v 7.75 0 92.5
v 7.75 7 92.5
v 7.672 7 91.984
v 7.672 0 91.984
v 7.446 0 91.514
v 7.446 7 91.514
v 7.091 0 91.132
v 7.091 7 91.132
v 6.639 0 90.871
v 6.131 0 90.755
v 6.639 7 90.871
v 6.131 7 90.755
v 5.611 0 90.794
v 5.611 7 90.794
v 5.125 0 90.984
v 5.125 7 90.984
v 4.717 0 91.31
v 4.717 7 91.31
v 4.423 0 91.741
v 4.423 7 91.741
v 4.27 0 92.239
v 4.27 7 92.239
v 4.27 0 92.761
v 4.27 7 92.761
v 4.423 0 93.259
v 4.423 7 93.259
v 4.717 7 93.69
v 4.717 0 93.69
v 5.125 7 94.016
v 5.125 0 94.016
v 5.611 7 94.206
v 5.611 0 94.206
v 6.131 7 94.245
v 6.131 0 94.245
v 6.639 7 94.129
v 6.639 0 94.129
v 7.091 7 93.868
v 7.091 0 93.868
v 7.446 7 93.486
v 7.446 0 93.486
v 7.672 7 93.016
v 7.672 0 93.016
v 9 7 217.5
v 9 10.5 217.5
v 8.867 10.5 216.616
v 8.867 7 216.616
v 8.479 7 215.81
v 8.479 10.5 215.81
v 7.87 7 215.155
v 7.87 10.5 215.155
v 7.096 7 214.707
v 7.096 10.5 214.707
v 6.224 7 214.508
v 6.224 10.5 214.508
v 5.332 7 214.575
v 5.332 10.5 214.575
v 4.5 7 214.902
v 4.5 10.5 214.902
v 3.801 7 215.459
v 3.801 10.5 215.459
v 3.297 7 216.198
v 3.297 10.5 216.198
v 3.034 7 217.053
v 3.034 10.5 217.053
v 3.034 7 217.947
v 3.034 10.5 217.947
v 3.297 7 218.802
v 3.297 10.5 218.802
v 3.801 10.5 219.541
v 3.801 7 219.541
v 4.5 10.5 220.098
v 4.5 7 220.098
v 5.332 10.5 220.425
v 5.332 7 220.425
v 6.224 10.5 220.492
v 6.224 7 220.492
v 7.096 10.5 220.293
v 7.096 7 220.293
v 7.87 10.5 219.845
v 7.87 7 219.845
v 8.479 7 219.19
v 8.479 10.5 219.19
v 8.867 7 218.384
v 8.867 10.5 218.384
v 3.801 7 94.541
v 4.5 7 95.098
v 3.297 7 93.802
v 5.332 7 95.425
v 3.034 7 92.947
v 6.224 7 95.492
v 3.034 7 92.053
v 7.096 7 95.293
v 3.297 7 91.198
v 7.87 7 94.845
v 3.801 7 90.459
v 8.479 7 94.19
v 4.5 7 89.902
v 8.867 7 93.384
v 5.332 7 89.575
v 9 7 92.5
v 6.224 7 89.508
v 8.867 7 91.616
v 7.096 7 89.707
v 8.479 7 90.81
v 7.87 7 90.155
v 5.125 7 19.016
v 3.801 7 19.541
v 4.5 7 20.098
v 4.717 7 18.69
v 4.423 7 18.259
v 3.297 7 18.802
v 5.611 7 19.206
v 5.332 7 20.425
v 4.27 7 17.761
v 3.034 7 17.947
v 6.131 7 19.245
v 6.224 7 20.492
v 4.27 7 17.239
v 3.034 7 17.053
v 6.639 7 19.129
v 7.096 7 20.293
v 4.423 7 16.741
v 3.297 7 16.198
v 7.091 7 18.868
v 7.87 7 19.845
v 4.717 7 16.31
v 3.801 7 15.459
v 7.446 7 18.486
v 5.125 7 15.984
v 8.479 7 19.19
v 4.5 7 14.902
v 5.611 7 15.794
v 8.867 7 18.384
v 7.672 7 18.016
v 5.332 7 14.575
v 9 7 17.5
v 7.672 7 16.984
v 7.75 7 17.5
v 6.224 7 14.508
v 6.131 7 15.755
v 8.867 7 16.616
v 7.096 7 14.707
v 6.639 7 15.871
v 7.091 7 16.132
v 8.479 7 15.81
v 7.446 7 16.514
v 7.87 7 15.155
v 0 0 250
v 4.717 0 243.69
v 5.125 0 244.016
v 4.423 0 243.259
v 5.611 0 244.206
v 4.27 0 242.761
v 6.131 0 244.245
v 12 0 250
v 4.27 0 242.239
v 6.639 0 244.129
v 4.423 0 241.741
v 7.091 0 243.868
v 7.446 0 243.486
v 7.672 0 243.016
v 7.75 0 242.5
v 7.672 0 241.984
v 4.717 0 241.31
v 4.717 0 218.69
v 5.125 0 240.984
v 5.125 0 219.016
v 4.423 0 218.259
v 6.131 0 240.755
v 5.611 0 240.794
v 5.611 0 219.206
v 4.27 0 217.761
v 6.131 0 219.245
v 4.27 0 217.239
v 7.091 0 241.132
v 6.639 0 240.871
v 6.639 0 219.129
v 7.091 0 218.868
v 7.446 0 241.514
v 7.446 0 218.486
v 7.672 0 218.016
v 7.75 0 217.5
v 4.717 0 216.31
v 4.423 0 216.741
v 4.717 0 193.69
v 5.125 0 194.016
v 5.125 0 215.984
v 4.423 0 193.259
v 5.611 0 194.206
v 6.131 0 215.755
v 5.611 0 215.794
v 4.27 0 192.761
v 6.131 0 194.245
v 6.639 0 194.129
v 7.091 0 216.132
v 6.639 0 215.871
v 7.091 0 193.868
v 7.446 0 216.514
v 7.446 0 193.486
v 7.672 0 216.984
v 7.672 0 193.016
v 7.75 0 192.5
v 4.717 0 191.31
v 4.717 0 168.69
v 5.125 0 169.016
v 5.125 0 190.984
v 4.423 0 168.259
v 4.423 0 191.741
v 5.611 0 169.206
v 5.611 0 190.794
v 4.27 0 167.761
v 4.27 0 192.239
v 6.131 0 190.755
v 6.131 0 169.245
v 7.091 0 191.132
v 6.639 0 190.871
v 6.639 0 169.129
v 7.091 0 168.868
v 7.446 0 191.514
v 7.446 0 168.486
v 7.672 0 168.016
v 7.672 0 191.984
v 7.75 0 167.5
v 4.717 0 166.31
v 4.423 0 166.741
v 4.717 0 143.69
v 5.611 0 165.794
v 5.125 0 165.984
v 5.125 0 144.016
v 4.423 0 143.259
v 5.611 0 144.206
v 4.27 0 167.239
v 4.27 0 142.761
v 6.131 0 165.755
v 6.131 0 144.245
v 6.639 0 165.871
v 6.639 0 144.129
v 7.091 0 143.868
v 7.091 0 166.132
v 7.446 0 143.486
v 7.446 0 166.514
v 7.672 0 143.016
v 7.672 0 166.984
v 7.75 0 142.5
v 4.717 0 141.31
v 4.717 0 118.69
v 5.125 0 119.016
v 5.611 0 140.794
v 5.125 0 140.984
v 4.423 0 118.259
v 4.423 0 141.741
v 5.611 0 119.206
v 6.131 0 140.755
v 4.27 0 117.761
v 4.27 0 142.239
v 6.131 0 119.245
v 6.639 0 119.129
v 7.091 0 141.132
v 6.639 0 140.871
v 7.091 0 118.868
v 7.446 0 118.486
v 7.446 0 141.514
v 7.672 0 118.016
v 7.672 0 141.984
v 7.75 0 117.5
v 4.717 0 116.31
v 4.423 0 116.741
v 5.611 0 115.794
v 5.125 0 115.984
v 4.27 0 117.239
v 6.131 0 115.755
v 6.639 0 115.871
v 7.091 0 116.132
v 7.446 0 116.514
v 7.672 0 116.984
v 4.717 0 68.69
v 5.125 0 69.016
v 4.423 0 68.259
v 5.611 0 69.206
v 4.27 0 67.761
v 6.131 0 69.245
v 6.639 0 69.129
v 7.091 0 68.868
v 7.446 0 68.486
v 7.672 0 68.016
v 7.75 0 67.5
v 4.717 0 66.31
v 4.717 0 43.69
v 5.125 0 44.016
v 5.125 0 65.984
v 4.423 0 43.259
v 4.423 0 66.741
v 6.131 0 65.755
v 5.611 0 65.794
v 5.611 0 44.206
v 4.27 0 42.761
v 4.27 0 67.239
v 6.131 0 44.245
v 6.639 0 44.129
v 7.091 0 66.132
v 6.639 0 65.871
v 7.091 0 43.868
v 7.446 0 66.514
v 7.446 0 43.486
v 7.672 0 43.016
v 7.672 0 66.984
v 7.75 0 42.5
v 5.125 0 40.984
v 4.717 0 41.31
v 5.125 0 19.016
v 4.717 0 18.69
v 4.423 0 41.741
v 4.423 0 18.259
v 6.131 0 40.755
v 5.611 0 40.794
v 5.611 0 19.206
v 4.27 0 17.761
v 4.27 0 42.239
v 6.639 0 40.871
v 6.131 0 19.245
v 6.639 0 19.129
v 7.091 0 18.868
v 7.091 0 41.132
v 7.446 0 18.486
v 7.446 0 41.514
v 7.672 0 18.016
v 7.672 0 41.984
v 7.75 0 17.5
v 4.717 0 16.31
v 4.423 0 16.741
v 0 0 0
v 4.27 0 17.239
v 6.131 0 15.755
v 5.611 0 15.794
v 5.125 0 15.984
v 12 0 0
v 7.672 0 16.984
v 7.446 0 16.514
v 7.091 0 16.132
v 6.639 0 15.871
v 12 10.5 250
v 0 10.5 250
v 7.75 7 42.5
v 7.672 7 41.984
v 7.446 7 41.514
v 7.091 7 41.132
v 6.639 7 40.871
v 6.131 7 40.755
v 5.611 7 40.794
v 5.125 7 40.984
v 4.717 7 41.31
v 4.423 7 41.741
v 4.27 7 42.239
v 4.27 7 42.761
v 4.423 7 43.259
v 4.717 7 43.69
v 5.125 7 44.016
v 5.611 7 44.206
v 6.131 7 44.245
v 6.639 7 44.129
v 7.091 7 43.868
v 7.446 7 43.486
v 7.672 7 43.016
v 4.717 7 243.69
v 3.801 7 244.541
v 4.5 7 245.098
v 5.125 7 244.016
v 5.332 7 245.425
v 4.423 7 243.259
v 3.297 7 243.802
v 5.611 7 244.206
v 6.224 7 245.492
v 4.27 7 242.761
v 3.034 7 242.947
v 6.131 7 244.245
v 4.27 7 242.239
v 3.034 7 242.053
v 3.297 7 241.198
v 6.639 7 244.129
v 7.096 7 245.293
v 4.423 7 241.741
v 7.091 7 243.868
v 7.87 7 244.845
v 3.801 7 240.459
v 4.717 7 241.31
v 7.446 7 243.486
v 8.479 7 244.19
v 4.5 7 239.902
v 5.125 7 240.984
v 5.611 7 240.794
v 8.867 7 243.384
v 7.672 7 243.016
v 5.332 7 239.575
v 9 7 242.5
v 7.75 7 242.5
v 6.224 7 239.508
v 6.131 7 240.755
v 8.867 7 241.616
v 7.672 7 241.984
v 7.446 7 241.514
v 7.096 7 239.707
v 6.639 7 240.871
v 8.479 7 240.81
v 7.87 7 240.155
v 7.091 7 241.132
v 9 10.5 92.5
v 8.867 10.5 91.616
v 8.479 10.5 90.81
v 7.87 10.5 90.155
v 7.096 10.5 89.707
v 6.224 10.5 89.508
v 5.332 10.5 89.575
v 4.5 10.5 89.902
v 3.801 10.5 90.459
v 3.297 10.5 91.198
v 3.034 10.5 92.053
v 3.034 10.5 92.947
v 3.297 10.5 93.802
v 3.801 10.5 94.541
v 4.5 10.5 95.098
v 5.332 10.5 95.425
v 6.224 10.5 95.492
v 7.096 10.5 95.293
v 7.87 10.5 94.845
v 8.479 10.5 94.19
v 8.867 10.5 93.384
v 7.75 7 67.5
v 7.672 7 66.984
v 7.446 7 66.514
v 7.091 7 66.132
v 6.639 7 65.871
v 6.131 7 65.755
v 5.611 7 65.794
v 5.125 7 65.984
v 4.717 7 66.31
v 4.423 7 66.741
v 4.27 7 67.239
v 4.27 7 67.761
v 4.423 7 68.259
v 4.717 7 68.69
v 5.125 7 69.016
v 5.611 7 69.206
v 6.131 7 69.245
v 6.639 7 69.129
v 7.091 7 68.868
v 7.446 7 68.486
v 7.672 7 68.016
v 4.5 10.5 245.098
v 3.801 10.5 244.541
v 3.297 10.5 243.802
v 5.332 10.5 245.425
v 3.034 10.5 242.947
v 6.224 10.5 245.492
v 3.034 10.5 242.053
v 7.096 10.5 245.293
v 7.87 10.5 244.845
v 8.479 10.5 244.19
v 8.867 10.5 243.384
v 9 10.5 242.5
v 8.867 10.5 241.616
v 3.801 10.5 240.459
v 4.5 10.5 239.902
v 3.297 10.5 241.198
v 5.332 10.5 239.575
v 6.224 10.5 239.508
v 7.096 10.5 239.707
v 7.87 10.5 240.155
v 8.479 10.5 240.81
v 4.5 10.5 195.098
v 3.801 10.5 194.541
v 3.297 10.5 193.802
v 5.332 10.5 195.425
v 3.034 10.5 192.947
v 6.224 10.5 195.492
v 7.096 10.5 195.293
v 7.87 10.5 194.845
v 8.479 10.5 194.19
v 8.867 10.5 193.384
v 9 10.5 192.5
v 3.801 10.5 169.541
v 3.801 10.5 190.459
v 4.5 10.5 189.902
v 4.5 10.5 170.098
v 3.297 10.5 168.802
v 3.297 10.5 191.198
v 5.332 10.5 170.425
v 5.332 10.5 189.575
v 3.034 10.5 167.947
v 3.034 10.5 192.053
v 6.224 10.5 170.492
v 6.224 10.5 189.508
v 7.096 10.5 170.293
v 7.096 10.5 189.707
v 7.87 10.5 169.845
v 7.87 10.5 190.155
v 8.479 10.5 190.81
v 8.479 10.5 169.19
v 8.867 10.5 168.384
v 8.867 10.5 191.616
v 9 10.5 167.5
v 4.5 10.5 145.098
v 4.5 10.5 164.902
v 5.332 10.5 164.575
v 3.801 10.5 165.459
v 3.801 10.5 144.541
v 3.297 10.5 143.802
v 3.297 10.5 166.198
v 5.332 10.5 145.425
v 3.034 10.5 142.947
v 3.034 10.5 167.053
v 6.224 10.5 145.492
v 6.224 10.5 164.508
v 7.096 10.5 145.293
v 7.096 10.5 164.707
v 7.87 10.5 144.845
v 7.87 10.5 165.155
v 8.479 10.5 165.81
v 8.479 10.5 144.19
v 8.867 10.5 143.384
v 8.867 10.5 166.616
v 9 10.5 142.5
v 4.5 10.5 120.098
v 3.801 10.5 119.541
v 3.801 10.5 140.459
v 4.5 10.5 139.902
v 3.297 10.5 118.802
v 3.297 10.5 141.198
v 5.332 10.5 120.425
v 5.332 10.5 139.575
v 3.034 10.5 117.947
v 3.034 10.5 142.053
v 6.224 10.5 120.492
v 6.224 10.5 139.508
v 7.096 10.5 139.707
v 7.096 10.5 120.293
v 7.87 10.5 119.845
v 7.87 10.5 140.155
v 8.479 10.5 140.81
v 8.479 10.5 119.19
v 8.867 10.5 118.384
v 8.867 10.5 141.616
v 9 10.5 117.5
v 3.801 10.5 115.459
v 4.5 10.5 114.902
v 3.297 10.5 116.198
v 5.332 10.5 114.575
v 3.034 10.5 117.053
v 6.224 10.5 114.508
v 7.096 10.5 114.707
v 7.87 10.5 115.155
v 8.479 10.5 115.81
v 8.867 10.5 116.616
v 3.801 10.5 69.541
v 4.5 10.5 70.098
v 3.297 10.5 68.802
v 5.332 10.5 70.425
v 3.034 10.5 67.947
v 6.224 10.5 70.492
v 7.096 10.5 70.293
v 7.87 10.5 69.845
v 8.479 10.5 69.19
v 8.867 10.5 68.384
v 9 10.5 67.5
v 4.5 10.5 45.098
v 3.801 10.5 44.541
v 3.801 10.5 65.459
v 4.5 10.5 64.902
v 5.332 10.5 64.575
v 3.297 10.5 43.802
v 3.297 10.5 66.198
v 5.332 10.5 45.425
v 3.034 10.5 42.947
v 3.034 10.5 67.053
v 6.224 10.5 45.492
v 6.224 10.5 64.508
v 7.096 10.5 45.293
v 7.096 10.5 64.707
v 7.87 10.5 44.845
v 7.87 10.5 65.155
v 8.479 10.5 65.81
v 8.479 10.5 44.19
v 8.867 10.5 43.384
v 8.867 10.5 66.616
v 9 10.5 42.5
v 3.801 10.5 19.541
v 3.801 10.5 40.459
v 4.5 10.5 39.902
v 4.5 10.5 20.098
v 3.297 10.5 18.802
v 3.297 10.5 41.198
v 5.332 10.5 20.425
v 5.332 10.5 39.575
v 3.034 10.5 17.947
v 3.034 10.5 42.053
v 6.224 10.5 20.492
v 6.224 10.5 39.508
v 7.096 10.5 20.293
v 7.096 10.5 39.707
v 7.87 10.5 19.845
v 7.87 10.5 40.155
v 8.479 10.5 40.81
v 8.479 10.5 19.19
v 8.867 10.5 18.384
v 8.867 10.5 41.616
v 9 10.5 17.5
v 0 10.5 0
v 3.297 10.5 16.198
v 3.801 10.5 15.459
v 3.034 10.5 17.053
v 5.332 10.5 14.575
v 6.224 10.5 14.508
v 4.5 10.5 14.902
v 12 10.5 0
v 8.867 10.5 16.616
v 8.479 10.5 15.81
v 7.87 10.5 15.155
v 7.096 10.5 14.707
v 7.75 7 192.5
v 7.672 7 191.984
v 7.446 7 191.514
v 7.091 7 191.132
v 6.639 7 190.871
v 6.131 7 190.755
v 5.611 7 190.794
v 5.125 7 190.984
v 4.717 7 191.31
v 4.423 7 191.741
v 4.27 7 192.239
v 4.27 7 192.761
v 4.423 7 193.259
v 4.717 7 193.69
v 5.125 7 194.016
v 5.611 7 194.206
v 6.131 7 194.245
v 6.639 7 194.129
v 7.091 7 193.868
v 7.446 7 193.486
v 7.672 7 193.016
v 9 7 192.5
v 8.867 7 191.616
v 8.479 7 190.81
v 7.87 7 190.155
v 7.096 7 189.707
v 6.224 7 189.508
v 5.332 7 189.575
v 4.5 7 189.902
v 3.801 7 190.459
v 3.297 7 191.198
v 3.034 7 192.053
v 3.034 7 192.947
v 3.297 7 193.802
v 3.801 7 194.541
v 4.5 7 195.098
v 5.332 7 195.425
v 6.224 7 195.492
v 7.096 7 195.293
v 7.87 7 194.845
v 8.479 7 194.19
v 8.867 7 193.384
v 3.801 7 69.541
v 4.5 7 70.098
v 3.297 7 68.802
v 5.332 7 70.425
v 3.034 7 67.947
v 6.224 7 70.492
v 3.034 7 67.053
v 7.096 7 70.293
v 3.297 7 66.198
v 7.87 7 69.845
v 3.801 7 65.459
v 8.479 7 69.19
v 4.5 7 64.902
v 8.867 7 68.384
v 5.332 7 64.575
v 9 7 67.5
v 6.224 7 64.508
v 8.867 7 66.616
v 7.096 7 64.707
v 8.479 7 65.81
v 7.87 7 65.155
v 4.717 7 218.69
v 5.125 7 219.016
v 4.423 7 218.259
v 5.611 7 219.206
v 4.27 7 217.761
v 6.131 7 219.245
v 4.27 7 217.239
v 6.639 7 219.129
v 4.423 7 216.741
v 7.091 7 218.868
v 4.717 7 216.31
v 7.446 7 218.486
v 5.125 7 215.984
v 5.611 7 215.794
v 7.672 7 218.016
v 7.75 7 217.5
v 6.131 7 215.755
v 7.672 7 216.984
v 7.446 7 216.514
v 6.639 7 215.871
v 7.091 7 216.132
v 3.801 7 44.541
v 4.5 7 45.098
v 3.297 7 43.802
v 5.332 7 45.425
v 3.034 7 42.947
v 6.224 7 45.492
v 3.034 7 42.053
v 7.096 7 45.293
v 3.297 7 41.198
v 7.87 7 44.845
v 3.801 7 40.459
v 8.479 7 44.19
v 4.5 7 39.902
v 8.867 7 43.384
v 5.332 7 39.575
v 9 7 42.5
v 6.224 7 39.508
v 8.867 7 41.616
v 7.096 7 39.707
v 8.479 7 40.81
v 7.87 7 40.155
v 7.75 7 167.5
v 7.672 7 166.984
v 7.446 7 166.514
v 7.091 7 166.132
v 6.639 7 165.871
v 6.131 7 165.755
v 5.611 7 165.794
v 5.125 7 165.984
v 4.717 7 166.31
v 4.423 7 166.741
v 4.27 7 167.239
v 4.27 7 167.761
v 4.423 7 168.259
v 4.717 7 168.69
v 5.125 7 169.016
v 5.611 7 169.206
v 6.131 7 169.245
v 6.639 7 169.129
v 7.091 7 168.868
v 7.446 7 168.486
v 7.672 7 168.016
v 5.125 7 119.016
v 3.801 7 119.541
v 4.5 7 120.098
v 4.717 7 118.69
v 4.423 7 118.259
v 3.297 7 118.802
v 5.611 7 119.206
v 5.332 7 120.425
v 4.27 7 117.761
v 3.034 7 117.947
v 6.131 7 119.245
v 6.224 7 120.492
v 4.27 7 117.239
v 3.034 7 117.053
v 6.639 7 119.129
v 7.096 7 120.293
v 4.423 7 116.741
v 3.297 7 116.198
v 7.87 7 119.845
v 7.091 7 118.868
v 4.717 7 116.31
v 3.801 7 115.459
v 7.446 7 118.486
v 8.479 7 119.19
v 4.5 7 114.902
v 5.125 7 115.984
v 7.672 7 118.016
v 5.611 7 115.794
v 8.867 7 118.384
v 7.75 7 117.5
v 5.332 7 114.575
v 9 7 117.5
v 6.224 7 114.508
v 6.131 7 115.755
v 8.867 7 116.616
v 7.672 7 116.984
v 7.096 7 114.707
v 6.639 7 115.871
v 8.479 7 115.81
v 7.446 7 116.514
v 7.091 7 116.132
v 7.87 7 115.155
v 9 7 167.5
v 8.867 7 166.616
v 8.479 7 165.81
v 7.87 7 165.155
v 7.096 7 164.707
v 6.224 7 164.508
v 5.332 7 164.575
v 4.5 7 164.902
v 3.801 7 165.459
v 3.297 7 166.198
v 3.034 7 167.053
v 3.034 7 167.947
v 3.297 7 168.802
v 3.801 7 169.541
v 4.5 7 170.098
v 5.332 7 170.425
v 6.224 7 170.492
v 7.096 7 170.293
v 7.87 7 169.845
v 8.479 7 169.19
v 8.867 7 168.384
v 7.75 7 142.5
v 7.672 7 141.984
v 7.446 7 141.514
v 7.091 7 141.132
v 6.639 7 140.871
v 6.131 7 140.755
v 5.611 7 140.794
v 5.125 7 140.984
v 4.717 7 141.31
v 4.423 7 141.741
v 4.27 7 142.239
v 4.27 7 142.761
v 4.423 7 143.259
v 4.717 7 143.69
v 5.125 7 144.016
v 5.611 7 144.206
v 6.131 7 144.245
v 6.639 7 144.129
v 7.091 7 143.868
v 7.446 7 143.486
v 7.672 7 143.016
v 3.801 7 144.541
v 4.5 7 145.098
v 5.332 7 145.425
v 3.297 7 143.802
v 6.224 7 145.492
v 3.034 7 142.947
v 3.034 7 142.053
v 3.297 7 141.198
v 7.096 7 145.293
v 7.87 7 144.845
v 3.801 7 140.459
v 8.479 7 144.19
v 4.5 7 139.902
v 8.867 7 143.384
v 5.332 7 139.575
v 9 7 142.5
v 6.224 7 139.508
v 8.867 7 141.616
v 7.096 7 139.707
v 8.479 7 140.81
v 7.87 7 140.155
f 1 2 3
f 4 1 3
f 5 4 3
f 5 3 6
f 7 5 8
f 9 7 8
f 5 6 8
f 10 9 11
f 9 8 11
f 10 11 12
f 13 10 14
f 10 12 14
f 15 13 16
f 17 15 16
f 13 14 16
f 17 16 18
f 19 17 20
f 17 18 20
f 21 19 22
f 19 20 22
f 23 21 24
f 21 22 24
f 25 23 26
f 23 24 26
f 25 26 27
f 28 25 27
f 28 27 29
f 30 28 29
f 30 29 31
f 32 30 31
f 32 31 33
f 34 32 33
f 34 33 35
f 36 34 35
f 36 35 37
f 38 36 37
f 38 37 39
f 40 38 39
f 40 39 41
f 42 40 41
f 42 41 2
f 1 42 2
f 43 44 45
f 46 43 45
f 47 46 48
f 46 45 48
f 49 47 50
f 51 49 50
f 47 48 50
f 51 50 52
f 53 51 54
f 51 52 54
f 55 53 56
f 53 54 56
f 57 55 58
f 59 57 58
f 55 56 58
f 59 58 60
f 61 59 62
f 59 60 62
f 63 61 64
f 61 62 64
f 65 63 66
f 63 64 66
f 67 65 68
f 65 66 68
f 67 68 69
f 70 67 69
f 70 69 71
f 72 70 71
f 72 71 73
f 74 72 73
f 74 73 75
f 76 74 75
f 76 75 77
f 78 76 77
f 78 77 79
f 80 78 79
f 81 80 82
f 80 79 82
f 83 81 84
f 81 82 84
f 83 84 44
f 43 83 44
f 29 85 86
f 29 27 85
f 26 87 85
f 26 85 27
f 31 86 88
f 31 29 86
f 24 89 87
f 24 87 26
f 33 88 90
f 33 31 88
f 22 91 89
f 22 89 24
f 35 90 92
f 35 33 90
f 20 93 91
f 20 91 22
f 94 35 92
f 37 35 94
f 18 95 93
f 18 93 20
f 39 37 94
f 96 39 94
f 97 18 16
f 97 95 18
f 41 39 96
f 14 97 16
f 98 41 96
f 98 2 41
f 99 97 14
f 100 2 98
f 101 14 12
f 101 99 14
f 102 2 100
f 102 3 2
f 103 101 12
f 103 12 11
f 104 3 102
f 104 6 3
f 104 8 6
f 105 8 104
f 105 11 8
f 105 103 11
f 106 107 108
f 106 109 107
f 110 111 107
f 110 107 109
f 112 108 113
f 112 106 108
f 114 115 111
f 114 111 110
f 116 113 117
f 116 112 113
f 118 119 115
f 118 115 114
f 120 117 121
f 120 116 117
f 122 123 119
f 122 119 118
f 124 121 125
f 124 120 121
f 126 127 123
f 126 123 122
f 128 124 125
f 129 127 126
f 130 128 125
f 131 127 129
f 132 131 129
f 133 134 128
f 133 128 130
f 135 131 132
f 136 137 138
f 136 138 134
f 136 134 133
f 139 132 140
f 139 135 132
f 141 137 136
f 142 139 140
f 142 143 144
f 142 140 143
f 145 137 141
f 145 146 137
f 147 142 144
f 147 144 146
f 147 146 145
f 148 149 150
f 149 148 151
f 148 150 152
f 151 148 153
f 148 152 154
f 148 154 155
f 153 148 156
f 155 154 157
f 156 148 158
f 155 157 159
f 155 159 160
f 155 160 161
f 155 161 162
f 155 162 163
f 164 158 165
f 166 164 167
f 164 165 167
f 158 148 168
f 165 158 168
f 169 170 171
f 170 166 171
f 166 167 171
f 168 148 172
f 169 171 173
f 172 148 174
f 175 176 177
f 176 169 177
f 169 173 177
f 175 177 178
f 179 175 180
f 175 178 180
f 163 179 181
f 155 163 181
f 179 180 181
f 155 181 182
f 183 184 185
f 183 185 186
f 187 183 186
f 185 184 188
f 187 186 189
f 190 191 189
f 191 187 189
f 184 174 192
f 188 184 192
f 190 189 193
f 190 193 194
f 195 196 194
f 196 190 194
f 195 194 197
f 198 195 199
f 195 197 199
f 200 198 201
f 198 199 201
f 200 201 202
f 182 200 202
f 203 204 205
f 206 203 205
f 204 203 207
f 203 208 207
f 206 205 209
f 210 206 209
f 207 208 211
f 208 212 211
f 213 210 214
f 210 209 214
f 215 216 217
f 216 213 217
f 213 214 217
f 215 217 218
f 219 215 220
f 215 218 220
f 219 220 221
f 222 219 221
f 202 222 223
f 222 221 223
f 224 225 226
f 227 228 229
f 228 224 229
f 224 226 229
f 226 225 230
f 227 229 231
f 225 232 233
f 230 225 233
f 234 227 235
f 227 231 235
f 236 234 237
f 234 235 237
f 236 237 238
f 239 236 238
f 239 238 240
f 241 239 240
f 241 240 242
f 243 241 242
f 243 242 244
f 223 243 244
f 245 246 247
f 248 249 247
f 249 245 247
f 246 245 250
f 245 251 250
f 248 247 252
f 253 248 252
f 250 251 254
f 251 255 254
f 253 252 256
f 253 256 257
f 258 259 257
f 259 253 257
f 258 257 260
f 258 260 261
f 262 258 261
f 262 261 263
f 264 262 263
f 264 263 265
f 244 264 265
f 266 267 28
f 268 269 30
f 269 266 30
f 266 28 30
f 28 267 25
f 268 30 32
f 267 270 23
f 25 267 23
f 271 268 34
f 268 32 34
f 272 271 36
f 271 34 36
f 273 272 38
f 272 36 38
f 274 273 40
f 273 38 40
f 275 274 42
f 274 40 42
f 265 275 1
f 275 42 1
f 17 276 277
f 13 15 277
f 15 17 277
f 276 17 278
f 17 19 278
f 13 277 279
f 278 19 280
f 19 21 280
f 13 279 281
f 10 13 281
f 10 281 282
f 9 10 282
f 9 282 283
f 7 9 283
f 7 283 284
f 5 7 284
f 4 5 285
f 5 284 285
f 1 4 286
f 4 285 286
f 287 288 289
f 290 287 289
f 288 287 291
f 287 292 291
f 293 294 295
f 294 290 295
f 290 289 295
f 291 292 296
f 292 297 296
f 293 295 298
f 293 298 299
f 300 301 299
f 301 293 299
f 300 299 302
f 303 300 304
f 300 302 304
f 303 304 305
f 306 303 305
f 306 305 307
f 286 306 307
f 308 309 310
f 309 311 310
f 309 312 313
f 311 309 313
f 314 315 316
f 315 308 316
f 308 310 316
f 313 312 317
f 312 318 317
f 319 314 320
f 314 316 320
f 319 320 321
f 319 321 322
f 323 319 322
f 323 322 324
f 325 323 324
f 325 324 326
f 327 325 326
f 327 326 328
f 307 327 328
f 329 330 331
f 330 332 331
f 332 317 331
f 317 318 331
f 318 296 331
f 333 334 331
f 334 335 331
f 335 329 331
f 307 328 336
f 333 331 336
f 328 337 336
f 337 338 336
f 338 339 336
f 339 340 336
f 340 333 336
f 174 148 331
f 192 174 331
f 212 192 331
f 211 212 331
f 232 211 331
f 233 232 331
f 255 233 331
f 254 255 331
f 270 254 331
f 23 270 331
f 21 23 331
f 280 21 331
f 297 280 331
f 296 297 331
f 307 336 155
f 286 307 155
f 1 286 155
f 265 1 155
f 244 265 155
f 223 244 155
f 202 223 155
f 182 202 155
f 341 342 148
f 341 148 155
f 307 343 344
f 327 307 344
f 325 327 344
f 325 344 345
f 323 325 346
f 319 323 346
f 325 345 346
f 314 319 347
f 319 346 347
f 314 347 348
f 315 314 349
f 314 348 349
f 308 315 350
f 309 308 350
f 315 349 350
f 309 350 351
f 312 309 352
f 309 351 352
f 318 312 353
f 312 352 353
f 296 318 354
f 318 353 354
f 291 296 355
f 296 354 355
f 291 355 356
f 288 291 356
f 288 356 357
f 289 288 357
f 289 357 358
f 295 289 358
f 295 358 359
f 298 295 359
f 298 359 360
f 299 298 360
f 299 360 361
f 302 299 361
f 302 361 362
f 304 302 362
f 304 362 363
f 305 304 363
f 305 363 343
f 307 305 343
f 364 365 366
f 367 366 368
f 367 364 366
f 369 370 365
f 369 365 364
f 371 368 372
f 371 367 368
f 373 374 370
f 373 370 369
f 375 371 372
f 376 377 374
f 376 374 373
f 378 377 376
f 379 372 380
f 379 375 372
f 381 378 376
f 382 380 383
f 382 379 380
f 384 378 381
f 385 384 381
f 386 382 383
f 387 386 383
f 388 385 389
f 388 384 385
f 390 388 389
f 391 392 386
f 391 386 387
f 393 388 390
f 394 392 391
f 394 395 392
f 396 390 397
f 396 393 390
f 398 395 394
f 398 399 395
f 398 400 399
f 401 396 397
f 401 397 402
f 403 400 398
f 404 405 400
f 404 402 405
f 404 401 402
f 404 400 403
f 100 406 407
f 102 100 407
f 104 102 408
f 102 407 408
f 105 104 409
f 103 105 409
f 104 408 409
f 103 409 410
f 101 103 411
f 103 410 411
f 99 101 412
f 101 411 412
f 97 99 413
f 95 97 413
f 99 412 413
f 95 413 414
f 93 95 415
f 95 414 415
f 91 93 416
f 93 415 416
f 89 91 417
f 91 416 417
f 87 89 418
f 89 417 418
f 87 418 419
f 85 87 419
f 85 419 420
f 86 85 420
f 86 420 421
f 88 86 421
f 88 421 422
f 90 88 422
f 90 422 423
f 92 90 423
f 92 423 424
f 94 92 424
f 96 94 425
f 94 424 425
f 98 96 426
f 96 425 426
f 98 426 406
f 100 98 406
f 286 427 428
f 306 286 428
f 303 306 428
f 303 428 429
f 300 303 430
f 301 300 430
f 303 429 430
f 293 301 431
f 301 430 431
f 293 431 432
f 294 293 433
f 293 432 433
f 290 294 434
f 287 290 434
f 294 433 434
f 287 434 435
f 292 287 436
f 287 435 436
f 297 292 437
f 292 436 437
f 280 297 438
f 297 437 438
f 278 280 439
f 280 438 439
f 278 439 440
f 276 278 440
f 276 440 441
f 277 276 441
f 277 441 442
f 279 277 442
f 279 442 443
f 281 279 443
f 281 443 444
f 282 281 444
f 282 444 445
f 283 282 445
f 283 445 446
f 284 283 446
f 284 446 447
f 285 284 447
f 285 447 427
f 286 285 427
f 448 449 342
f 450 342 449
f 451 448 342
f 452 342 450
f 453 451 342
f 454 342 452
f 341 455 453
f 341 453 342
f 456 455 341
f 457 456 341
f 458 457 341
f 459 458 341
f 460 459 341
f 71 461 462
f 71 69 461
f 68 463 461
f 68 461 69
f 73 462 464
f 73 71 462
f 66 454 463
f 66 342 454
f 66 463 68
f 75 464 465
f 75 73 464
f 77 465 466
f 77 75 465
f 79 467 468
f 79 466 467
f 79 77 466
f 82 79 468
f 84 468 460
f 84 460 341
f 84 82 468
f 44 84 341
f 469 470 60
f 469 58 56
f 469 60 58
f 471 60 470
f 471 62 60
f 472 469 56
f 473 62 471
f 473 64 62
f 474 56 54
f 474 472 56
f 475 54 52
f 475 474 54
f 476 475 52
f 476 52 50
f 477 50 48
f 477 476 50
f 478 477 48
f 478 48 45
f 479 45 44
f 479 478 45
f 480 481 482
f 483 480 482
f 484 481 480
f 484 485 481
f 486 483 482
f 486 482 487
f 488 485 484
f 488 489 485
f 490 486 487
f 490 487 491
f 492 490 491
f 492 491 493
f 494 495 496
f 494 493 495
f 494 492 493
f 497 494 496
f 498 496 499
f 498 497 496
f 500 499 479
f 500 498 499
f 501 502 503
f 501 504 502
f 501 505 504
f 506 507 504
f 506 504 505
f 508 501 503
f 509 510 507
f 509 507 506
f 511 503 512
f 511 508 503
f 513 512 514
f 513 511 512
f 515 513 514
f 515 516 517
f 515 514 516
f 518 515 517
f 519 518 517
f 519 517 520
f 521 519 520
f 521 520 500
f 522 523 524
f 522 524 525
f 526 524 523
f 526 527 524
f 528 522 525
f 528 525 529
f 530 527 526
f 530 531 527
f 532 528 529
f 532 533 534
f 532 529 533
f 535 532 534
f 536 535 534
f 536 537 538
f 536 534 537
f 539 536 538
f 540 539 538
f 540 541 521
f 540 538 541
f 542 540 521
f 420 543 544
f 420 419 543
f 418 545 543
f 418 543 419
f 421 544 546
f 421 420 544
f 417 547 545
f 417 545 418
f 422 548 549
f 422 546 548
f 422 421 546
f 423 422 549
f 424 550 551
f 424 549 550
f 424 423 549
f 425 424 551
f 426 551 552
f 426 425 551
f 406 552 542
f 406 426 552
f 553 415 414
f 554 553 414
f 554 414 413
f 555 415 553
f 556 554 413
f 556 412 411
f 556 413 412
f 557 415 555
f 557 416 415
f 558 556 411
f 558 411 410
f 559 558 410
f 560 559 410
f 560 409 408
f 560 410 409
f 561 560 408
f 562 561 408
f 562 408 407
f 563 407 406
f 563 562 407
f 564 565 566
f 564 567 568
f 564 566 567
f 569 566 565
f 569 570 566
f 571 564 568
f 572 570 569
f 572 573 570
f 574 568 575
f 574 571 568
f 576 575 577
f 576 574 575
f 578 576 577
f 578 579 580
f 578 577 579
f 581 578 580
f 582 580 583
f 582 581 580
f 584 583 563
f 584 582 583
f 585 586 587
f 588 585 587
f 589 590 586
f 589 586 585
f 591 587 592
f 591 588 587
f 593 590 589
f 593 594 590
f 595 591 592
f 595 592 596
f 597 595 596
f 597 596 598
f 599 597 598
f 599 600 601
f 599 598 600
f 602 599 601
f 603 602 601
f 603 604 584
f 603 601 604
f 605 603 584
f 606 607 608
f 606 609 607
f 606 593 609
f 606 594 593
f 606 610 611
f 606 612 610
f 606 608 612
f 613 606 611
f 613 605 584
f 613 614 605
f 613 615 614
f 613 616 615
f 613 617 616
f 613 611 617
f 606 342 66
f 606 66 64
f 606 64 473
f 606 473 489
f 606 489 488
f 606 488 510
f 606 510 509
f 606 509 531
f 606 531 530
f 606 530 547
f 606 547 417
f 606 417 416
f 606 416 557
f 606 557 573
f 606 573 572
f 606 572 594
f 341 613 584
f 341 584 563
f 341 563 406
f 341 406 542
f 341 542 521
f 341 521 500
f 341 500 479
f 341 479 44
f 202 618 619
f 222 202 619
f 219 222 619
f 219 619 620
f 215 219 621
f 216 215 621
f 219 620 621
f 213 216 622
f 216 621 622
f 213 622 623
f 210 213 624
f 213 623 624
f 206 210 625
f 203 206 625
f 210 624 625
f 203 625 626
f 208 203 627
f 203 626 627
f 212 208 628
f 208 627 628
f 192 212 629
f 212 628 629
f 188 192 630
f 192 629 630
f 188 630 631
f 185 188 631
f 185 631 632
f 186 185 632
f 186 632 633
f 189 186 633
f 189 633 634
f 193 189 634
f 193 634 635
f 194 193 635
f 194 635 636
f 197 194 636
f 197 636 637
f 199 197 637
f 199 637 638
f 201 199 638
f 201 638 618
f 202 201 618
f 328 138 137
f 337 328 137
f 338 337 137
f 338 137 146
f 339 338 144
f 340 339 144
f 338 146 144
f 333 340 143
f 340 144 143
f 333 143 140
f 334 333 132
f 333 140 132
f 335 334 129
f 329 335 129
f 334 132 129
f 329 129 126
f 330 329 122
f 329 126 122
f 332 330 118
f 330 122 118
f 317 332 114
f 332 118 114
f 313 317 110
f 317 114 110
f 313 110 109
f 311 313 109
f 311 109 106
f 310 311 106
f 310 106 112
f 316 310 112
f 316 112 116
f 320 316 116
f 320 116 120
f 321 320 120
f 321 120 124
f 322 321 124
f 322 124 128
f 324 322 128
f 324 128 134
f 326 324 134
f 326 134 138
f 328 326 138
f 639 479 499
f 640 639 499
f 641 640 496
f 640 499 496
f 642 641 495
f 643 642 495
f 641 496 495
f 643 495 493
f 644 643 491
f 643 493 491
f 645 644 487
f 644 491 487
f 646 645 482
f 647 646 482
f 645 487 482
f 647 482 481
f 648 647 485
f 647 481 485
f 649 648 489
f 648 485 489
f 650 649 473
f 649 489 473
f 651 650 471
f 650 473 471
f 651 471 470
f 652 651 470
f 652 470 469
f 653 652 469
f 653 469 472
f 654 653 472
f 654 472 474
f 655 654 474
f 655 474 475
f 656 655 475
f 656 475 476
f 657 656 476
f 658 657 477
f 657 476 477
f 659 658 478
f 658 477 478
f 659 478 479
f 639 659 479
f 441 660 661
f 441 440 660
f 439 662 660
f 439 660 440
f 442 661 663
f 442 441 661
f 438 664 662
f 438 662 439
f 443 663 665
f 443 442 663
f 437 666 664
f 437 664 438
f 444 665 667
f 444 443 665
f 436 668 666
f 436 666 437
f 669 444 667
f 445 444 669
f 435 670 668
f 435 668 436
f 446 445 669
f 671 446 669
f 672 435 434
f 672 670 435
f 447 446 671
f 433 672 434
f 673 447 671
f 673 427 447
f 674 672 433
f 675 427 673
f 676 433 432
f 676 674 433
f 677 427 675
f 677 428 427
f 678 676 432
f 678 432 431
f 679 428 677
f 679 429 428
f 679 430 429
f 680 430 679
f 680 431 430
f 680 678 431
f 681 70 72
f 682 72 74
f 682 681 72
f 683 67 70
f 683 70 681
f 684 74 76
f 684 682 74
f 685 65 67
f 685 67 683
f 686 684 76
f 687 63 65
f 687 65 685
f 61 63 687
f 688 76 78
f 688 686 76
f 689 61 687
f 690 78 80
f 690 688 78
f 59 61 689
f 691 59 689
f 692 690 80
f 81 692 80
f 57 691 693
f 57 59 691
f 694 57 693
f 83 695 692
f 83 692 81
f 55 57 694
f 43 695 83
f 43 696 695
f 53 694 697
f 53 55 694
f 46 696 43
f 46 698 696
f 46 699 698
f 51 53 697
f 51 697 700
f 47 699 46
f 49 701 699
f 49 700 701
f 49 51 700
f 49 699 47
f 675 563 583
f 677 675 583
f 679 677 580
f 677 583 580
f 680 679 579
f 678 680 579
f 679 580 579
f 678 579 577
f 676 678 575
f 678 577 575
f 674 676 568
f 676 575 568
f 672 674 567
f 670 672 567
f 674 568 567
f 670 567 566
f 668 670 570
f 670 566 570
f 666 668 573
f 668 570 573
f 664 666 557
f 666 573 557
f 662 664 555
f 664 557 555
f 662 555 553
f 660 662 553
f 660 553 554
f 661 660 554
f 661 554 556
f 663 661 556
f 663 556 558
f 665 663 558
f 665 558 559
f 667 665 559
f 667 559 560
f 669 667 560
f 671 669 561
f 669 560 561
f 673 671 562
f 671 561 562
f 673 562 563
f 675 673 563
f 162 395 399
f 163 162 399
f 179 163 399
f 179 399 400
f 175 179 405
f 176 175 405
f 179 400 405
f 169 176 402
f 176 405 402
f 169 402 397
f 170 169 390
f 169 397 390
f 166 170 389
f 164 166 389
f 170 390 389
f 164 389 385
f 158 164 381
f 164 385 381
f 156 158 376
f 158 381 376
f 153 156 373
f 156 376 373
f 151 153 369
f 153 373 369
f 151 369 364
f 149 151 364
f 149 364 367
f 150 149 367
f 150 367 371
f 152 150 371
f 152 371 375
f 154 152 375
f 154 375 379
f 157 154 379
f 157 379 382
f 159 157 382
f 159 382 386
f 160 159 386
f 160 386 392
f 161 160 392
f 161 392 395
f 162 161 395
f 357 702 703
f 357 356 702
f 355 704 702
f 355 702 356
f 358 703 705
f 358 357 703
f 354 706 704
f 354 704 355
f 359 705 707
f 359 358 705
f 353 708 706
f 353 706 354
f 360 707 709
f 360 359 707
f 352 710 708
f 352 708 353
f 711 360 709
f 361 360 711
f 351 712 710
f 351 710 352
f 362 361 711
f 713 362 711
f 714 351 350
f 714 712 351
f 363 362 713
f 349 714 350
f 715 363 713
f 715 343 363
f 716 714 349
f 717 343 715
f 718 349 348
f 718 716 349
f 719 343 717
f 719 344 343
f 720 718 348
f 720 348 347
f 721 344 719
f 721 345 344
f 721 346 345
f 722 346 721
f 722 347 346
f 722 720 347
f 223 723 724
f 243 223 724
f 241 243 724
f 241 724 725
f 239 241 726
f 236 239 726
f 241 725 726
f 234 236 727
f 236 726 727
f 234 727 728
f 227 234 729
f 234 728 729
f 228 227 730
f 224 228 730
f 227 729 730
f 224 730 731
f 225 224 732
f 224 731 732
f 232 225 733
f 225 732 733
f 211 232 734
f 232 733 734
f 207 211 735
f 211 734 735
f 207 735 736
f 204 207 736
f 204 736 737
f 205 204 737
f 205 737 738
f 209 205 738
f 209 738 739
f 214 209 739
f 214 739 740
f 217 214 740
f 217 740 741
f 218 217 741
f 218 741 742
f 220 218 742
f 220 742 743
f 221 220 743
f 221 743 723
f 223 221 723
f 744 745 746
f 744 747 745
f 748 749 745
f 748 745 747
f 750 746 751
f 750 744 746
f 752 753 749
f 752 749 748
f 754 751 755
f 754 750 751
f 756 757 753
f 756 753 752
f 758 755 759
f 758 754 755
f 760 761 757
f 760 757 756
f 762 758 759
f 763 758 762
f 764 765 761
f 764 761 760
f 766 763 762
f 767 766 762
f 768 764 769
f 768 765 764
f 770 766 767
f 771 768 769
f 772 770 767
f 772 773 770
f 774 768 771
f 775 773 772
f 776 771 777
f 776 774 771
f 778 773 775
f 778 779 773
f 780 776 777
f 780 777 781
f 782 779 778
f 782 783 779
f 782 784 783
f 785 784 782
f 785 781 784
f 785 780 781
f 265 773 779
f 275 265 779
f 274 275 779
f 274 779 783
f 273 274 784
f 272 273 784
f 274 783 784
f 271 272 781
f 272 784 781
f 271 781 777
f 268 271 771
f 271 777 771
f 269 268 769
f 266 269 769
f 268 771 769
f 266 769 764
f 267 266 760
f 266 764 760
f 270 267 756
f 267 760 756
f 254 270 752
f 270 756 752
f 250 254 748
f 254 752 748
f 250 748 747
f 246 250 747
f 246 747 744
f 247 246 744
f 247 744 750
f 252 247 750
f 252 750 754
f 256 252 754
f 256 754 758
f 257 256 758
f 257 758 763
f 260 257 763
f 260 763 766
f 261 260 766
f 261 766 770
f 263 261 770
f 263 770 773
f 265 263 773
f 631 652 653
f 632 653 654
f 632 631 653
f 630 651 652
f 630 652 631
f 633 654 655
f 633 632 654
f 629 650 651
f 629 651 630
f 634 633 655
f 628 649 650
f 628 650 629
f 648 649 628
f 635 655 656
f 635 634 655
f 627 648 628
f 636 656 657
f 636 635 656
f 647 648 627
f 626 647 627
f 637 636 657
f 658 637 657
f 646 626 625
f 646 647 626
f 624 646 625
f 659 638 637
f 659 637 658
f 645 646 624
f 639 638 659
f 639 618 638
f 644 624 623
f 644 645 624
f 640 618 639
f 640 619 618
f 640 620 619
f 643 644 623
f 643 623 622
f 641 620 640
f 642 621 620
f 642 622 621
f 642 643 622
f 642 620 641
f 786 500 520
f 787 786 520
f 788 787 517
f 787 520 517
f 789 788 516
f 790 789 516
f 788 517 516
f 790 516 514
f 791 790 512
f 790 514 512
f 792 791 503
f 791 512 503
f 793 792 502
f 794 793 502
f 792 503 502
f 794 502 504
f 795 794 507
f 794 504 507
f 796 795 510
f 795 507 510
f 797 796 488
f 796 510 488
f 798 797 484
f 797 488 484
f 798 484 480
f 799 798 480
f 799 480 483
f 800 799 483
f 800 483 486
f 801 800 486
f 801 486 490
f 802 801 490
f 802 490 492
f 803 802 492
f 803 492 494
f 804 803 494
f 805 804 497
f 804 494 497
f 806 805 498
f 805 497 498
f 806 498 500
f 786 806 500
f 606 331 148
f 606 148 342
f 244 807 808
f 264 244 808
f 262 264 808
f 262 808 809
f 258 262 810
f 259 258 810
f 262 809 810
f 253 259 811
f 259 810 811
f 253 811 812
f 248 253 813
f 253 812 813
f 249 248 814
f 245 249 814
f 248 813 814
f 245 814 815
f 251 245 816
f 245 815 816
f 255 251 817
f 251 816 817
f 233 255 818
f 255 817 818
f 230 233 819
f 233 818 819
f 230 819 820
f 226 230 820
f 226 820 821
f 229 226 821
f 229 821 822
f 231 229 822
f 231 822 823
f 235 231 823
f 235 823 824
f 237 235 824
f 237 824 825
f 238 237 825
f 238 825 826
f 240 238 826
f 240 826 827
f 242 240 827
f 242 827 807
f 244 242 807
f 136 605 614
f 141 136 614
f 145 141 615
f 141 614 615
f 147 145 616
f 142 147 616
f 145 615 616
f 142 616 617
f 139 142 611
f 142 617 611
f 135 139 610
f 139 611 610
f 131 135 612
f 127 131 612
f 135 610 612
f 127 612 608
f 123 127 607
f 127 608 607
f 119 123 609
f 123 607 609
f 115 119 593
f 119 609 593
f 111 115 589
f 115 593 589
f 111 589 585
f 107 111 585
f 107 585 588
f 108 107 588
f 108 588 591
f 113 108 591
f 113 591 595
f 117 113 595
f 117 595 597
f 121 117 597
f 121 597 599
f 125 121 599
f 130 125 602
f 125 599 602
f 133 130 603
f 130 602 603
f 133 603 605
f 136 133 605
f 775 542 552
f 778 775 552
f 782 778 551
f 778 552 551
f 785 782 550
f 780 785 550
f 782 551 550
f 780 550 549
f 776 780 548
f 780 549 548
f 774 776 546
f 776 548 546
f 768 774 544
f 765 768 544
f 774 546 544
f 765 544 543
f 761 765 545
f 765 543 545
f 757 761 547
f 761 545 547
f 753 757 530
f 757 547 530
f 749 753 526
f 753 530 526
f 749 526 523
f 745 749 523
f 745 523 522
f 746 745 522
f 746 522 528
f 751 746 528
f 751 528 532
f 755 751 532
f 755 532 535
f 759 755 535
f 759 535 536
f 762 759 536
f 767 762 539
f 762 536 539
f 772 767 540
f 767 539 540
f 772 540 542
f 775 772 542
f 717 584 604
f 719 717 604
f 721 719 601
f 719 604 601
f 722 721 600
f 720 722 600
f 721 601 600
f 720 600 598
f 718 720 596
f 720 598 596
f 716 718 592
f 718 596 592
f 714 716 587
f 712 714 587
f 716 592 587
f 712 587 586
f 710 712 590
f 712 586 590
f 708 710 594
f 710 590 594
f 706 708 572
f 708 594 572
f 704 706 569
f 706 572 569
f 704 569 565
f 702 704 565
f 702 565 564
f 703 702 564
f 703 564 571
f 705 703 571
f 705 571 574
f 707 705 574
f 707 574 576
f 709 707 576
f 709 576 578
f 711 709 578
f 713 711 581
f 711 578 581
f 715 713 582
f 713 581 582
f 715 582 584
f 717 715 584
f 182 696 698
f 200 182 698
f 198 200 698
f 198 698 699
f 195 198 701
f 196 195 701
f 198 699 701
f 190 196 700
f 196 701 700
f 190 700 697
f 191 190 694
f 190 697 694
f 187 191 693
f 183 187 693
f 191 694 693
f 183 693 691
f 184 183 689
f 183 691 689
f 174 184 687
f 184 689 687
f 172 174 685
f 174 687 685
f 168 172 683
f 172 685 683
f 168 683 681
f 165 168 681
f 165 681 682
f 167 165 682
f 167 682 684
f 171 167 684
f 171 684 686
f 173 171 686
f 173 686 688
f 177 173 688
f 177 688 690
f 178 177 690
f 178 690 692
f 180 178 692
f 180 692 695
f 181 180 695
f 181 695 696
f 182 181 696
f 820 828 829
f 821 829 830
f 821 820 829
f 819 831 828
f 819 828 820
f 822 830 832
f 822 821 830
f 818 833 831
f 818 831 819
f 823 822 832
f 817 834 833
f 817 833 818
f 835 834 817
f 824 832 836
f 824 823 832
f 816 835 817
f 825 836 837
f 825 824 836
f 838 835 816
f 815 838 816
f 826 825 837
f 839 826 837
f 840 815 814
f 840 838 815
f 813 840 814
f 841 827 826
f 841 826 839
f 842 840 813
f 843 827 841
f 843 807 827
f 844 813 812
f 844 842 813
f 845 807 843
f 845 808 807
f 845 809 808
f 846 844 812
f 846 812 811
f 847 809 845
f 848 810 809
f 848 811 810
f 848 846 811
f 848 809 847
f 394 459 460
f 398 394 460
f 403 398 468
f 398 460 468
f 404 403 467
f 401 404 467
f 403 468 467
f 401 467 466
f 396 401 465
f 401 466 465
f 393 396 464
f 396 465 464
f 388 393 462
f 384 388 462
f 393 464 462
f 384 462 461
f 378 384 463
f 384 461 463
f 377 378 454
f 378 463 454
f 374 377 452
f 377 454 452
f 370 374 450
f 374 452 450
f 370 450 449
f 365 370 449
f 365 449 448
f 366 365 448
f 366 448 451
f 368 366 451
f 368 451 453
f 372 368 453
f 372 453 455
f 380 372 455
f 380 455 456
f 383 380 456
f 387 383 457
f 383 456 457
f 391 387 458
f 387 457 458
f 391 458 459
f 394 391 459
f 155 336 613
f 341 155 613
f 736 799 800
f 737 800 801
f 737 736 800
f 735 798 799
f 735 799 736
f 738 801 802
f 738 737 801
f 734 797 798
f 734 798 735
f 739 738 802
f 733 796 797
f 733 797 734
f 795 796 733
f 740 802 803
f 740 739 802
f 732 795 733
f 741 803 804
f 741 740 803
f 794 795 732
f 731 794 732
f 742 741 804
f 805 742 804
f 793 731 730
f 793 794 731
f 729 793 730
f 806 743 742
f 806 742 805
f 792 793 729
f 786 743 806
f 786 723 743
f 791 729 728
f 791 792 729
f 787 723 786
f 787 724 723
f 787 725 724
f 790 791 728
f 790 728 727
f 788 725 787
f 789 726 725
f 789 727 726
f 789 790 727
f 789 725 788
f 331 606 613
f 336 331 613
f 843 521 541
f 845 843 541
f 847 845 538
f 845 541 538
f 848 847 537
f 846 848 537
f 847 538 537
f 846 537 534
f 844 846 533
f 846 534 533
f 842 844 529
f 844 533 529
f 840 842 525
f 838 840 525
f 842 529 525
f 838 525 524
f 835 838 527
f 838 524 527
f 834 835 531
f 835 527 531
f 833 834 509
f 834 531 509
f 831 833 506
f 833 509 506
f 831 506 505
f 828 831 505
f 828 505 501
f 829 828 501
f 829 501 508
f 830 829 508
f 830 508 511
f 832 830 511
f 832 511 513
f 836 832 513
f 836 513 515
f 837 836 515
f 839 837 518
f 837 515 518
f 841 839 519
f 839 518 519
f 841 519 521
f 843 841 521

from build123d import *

# Parameters (mm, degrees)
SKETCH1_W           = 12
SKETCH1_H           = 10.5
BOSS_EXTRUDE1_DEPTH = 250
SKETCH2_R           = 3
CUT_EXTRUDE1_DEPTH  = 3.5
SKETCH3_R           = 1.75
CUT_EXTRUDE2_DEPTH  = 8
LPATTERN1_COUNT     = 12
LPATTERN1_PITCH     = 25


with BuildPart() as part:
    # Sketch1 → Boss-Extrude1 (new body)
    with BuildSketch(Plane.XY):
        with Locations((6, 5.25)):
            Rectangle(SKETCH1_W, SKETCH1_H)
    extrude(amount=BOSS_EXTRUDE1_DEPTH)

    # Sketch2 → Cut-Extrude1 (cut)
    with BuildSketch(Plane(origin=(0, 10.5, 0), x_dir=(1, 0, 0), z_dir=(0, 1, 0))):
        with Locations((6, -242.5)):
            Circle(SKETCH2_R)
    cut_extrude1 = extrude(amount=-CUT_EXTRUDE1_DEPTH, mode=Mode.SUBTRACT)

    # Sketch3 → Cut-Extrude2 (cut, through all)
    with BuildSketch(Plane(origin=(0, 7, 0), x_dir=(1, 0, 0), z_dir=(0, 1, 0))):
        with Locations((6, -242.5)):
            Circle(SKETCH3_R)
    cut_extrude2 = extrude(amount=-CUT_EXTRUDE2_DEPTH, mode=Mode.SUBTRACT)

    # LPattern1: Cut-Extrude1, Cut-Extrude2 ×12
    with Locations(*[(0, 0, -i * LPATTERN1_PITCH) for i in range(1, LPATTERN1_COUNT)]):
        add(cut_extrude1, mode=Mode.SUBTRACT)
        add(cut_extrude2, mode=Mode.SUBTRACT)


solid = part.part
